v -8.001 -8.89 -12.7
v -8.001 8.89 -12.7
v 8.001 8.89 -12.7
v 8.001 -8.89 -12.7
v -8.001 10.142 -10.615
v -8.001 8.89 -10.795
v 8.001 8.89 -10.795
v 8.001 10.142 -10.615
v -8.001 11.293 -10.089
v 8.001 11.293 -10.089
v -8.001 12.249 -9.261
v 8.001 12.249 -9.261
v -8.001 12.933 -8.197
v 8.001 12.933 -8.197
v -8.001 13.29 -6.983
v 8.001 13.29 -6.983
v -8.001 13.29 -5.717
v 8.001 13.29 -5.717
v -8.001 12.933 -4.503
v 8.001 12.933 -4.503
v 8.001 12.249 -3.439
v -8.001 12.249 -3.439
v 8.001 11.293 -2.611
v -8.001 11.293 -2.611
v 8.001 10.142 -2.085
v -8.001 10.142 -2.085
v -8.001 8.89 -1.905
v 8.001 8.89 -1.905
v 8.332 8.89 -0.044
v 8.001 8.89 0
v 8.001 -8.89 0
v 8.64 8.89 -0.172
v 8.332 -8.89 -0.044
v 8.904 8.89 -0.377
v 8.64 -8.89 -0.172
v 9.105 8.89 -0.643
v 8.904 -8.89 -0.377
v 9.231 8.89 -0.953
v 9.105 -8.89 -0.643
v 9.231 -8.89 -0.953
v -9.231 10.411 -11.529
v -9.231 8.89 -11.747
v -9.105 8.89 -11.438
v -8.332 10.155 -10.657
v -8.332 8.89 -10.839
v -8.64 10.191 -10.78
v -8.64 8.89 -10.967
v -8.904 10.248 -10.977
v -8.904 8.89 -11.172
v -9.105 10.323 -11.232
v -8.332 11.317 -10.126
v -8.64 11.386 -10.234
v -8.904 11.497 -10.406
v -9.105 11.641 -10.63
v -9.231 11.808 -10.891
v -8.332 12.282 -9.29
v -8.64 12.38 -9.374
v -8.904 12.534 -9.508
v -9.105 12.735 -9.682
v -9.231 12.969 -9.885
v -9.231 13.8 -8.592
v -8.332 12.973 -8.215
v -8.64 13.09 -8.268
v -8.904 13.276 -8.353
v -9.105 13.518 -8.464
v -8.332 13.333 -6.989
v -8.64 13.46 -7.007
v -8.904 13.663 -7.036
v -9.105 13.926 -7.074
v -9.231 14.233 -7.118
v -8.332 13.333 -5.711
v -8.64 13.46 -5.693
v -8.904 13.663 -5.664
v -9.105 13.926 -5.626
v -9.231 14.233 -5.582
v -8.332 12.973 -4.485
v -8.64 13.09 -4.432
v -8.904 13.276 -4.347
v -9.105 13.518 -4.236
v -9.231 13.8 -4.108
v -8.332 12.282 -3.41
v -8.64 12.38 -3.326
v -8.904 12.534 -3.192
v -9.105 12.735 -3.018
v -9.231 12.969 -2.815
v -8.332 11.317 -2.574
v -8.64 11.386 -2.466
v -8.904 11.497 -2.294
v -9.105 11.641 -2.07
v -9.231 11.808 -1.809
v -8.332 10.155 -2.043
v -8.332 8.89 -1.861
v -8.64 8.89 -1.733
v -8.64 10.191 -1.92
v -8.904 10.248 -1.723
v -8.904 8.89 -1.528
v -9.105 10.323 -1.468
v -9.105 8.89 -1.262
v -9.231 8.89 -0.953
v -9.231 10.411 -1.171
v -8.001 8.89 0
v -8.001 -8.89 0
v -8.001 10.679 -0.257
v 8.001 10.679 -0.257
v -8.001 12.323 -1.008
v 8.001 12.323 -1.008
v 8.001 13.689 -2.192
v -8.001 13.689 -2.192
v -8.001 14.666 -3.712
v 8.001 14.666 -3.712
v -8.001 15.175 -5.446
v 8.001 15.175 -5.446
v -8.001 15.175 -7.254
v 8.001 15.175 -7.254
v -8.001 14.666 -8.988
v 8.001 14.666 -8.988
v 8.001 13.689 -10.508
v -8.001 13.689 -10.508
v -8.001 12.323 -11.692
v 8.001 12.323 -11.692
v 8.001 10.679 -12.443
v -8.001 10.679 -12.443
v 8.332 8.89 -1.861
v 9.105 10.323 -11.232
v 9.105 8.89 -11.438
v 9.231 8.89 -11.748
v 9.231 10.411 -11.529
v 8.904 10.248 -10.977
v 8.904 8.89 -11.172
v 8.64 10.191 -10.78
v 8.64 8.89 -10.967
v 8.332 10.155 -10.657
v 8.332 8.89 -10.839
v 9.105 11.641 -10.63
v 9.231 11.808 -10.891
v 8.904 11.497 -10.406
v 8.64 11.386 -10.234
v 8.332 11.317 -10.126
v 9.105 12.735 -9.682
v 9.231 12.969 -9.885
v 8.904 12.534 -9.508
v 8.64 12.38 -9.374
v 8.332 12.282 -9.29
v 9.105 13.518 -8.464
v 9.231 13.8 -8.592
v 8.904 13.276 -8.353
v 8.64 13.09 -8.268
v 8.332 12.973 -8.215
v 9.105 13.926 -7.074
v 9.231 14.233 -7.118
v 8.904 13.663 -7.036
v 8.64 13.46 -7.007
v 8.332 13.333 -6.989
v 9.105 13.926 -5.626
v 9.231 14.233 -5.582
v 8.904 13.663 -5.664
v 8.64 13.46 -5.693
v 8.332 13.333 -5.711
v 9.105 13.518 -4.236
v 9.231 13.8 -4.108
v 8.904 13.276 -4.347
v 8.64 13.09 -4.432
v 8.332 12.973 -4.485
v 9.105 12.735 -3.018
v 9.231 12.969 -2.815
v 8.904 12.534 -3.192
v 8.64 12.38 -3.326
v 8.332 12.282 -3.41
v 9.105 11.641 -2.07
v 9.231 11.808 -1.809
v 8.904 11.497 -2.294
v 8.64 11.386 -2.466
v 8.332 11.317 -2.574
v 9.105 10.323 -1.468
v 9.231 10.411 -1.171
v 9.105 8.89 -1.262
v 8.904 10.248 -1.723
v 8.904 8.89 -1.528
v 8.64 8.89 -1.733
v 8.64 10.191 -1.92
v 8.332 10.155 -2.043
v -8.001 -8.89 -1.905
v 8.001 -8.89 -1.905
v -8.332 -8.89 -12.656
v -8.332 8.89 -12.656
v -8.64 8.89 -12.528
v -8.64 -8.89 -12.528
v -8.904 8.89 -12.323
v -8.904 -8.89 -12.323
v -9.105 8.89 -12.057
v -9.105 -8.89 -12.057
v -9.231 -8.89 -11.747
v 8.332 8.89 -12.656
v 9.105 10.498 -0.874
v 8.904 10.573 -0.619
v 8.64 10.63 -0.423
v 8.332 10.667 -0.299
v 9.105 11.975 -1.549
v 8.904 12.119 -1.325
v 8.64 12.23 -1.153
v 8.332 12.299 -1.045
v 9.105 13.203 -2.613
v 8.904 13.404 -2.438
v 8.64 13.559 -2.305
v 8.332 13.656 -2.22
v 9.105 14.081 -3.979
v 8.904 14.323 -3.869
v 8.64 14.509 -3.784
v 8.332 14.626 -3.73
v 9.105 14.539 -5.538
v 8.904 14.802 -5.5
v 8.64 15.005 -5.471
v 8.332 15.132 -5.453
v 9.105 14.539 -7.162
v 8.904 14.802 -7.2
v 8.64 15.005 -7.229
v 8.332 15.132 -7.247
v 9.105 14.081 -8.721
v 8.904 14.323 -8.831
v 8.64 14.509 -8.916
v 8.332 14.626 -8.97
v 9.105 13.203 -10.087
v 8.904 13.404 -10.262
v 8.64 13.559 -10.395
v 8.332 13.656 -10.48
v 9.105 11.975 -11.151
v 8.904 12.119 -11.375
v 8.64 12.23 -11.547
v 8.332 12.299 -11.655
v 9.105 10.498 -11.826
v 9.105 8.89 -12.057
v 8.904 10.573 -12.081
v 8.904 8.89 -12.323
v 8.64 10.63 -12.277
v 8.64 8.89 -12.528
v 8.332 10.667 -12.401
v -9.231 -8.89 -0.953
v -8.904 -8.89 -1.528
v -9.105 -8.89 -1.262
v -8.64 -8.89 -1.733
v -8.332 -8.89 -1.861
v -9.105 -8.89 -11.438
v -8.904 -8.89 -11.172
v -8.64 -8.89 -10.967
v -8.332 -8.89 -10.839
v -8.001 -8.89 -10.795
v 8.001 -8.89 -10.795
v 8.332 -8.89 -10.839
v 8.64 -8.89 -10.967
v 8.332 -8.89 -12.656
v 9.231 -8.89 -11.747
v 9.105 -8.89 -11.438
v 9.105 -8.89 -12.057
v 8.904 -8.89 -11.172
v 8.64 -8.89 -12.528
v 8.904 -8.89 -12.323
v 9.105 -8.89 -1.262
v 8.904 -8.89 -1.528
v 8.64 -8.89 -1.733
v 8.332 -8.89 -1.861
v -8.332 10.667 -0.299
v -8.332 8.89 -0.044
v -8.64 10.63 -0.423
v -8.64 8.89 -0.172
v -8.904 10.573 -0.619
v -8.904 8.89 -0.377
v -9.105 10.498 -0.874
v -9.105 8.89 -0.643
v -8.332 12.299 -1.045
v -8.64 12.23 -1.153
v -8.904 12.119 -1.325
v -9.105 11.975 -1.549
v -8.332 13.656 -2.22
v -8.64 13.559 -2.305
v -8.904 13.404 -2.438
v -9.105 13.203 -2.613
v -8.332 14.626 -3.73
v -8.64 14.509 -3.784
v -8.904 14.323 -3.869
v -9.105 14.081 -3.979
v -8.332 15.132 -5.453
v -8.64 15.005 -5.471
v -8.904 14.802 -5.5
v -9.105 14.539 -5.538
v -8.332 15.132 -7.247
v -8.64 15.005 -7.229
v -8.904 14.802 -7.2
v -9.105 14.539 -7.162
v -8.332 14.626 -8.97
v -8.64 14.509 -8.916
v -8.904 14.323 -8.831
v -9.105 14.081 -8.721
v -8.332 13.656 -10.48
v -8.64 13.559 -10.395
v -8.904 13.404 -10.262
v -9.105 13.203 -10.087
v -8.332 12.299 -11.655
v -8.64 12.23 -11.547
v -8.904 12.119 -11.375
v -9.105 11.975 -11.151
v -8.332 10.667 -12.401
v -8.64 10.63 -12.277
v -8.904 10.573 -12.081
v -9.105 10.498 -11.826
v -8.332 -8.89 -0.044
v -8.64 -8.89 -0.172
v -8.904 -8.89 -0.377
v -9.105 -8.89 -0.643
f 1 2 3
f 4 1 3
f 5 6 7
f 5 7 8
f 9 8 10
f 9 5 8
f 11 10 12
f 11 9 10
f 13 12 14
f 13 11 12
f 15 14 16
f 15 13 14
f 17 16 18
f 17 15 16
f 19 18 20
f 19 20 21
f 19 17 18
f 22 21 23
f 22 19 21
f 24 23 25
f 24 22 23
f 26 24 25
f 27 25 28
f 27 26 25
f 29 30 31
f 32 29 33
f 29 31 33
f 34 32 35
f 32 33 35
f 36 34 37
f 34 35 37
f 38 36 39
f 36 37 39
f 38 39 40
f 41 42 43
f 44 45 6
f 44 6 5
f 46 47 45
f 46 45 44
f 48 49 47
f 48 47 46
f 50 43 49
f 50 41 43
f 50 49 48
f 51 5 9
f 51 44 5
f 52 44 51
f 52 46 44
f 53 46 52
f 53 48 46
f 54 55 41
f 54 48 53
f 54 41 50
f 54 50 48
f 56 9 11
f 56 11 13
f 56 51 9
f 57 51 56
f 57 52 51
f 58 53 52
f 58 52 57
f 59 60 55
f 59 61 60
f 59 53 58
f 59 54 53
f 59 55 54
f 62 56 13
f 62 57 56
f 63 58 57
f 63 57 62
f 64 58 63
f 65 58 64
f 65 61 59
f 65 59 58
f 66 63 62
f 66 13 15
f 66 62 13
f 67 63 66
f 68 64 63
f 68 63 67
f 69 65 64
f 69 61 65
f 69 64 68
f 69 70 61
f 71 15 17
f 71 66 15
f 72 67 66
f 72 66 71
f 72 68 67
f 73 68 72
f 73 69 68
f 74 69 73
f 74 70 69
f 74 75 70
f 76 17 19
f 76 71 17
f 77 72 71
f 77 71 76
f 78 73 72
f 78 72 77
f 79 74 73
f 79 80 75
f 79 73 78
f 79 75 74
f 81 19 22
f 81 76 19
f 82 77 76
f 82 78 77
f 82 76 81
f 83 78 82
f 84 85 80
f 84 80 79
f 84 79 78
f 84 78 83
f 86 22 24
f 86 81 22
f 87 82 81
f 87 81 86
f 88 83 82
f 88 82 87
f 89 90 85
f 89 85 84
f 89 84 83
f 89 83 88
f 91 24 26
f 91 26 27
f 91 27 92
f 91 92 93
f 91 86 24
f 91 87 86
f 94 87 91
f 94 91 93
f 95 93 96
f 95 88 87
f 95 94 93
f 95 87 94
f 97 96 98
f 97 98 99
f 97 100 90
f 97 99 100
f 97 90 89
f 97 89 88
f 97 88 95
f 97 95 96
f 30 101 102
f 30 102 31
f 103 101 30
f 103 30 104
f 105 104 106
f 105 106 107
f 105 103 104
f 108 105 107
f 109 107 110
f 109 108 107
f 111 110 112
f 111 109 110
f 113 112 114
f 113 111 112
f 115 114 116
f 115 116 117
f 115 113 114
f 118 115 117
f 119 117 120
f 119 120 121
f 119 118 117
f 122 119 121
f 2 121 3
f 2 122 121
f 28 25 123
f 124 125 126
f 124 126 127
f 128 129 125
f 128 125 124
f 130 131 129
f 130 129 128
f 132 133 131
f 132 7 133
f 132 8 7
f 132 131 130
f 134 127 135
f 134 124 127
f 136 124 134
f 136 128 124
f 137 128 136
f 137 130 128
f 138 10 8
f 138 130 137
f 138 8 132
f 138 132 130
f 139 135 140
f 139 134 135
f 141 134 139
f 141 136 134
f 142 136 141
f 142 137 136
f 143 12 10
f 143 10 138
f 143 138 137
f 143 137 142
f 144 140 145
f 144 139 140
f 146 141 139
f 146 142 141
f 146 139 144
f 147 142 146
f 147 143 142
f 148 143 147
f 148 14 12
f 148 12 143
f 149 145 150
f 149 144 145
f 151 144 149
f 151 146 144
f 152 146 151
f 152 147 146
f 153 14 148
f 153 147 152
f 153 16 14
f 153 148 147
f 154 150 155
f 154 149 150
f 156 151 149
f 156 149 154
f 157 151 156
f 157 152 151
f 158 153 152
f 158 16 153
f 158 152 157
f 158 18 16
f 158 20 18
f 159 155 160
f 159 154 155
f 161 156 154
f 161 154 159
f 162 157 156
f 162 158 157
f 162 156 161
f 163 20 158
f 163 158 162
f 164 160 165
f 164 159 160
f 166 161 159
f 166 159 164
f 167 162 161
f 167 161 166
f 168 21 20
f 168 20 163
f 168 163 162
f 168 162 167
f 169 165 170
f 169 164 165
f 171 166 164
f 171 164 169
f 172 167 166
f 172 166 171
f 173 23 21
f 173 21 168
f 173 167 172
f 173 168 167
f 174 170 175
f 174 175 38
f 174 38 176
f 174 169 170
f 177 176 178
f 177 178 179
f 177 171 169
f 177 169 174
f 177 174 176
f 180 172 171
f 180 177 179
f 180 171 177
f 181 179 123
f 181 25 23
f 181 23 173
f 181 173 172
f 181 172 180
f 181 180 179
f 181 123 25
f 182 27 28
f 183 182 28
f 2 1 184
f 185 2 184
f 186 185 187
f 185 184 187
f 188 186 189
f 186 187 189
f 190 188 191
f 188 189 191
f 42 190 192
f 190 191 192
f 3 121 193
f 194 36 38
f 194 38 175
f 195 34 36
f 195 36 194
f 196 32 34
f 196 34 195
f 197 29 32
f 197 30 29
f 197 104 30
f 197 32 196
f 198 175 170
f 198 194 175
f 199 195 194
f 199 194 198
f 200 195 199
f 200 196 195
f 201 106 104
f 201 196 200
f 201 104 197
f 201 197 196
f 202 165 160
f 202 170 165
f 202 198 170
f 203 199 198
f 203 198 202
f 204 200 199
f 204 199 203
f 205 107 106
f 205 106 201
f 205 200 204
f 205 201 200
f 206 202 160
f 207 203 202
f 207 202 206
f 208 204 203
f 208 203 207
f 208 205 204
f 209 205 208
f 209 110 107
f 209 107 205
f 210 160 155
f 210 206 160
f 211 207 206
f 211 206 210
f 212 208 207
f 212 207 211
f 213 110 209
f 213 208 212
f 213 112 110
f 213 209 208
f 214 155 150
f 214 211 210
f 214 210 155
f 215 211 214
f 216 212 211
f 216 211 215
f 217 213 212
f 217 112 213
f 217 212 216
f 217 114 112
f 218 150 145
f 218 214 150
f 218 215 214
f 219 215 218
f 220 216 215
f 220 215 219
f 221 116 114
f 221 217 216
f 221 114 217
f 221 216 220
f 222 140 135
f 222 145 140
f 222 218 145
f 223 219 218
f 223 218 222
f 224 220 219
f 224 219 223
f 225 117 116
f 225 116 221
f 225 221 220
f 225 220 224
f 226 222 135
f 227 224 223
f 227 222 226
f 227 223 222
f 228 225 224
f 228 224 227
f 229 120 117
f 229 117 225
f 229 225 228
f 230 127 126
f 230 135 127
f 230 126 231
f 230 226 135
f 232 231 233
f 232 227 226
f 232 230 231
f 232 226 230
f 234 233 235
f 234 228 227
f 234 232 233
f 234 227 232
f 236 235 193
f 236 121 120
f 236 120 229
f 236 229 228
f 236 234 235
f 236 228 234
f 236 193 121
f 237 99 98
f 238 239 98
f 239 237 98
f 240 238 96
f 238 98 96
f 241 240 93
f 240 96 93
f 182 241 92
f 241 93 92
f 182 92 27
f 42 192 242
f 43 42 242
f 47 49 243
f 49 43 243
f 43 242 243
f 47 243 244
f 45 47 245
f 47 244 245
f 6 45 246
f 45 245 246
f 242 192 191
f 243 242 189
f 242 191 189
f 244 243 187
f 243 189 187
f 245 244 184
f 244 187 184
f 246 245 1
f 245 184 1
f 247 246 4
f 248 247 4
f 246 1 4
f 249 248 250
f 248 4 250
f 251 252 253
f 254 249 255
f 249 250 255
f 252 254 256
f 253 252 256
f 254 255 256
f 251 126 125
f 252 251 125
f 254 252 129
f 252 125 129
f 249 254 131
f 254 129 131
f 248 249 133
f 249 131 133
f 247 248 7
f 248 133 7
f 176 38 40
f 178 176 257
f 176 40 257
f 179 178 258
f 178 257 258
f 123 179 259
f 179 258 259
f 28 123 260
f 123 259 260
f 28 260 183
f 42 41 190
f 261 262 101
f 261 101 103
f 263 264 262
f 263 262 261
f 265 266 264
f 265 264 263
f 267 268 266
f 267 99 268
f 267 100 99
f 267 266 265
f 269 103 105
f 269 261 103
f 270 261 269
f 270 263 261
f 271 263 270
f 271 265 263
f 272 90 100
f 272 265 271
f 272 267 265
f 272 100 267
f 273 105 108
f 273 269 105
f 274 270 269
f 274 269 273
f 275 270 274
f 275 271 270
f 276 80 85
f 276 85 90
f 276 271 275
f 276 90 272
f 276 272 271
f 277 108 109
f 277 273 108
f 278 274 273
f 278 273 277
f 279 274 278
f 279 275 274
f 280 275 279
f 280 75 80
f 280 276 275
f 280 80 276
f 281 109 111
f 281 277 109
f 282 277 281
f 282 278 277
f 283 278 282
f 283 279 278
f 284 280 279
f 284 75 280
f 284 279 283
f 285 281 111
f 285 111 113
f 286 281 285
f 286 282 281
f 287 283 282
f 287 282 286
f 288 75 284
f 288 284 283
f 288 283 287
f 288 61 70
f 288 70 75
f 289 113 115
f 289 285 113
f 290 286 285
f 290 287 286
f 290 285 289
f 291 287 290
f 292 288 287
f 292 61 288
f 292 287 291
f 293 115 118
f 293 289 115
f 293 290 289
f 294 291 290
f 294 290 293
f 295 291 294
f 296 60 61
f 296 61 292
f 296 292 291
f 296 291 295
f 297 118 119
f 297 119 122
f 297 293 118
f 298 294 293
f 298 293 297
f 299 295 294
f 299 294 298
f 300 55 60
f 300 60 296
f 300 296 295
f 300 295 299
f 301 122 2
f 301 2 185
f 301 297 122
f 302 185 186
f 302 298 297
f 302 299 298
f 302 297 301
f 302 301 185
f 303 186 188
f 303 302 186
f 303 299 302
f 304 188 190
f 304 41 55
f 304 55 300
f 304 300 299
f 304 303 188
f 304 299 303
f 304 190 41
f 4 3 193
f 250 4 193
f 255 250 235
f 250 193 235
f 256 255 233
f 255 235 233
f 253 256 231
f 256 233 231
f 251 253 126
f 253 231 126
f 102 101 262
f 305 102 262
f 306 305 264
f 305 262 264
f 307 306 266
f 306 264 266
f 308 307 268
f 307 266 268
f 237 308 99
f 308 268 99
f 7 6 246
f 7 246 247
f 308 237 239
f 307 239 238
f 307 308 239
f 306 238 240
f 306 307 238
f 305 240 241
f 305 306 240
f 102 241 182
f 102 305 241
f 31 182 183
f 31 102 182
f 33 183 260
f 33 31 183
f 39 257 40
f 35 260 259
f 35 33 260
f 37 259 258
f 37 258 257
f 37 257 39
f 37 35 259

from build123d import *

# Parameters (mm, degrees)
SKETCH1_W           = 18.542
SKETCH1_H           = 17.78
BOSS_EXTRUDE4_DEPTH = 1.905
SKETCH4_W           = 18.542
SKETCH4_H           = 17.78
BOSS_EXTRUDE5_DEPTH = 1.905
BOSS_EXTRUDE6_DEPTH = 18.542
FILLET1_R           = 1.27


with BuildPart() as part:
    # Sketch1 → Boss-Extrude4 (new body)
    with BuildSketch(Plane.XY):
        Rectangle(SKETCH1_W, SKETCH1_H)
    extrude(amount=-BOSS_EXTRUDE4_DEPTH)



with BuildPart() as body_2:
    # Sketch4 → Boss-Extrude5 (new body)
    with BuildSketch(Plane.XY.offset(-12.7)):
        Rectangle(SKETCH4_W, SKETCH4_H)
    extrude(amount=BOSS_EXTRUDE5_DEPTH)


with BuildPart() as part_1:
    add(part.part)

    add(body_2.part)  # Boss-Extrude6 merges body 2
    # Sketch6 → Boss-Extrude6 (add)
    with BuildSketch(Plane.ZY.offset(9.271)):
        with BuildLine():
            Line((-12.7, 8.89), (-10.795, 8.89))
            ThreePointArc((-10.795, 8.89), (-6.35, 13.335), (-1.905, 8.89))
            Line((-1.905, 8.89), (0, 8.89))
            ThreePointArc((0, 8.89), (-6.35, 15.24), (-12.7, 8.89))
        make_face()
    extrude(amount=-BOSS_EXTRUDE6_DEPTH)

    # Fillet1
    # the kernel refuses this fillet: 1.27 mm, written as the material it takes off along each edge
    with BuildSketch(Plane(origin=(9.271, 8.89, -6.35), x_dir=(0, 0, -1), z_dir=(0, -1, 0))) as fillet1_piece_1:
        with BuildLine():
            CenterArc((4.445 + FILLET1_R, -FILLET1_R), FILLET1_R, 90, 90)
            Line((4.445, -FILLET1_R), (4.445, 0))
            Line((4.445, 0), (4.445 + FILLET1_R, 0))
        make_face()
    revolve(axis=Axis((9.271, 8.89, -6.35), (1, 0, 0)), revolution_arc=180, mode=Mode.SUBTRACT)
    with BuildSketch(Plane(origin=(-9.271, 8.89, -6.35), x_dir=(0, 0, -1), z_dir=(0, -1, 0))) as fillet1_piece_2:
        with BuildLine():
            CenterArc((4.445 + FILLET1_R, FILLET1_R), FILLET1_R, 180, 90)
            Line((4.445, FILLET1_R), (4.445, 0))
            Line((4.445, 0), (4.445 + FILLET1_R, 0))
        make_face()
    revolve(axis=Axis((-9.271, 8.89, -6.35), (1, 0, 0)), revolution_arc=180, mode=Mode.SUBTRACT)
    with BuildSketch(Plane(origin=(9.271, 8.89, -6.35), x_dir=(0, 0, 1), z_dir=(0, -1, 0))) as fillet1_piece_3:
        with BuildLine():
            CenterArc((6.35 - FILLET1_R, FILLET1_R), FILLET1_R, 270, 90)
            Line((6.35, FILLET1_R), (6.35, 0))
            Line((6.35, 0), (6.35 - FILLET1_R, 0))
        make_face()
    revolve(axis=Axis((9.271, 8.89, -6.35), (-1, 0, 0)), revolution_arc=180, mode=Mode.SUBTRACT)
    with BuildSketch(Plane(origin=(-9.271, 8.89, -6.35), x_dir=(0, 0, 1), z_dir=(0, -1, 0))) as fillet1_piece_4:
        with BuildLine():
            CenterArc((6.35 - FILLET1_R, -FILLET1_R), FILLET1_R, 0, 90)
            Line((6.35, -FILLET1_R), (6.35, 0))
            Line((6.35, 0), (6.35 - FILLET1_R, 0))
        make_face()
    revolve(axis=Axis((-9.271, 8.89, -6.35), (-1, 0, 0)), revolution_arc=180, mode=Mode.SUBTRACT)
    with BuildSketch(Plane(origin=(-9.271, -12.065, -12.7), x_dir=(0, 0, 1), z_dir=(0, 1, 0)), Plane(origin=(-9.271, 8.89, 0), x_dir=(0, 0, -1), z_dir=(0, -1, 0)), Plane(origin=(9.271, -12.065, 0), x_dir=(0, 0, -1), z_dir=(0, 1, 0)), Plane(origin=(9.271, 8.89, -12.7), x_dir=(0, 0, 1), z_dir=(0, -1, 0))) as fillet1_piece_5:
        with BuildLine():
            CenterArc((FILLET1_R, FILLET1_R), FILLET1_R, 180, 90)
            Line((0, FILLET1_R), (0, 0))
            Line((0, 0), (FILLET1_R, 0))
        make_face()
    extrude(amount=20.955, mode=Mode.SUBTRACT)
    with BuildSketch(Plane(origin=(-9.271, -12.065, -10.795), x_dir=(0, 0, -1), z_dir=(0, 1, 0)), Plane(origin=(-9.271, 8.89, -1.905), x_dir=(0, 0, 1), z_dir=(0, -1, 0)), Plane(origin=(9.271, -12.065, -1.905), x_dir=(0, 0, 1), z_dir=(0, 1, 0)), Plane(origin=(9.271, 8.89, -10.795), x_dir=(0, 0, -1), z_dir=(0, -1, 0))) as fillet1_piece_6:
        with BuildLine():
            CenterArc((FILLET1_R, -FILLET1_R), FILLET1_R, 90, 90)
            Line((0, -FILLET1_R), (0, 0))
            Line((0, 0), (FILLET1_R, 0))
        make_face()
    extrude(amount=20.955, mode=Mode.SUBTRACT)


solid = part_1.part
